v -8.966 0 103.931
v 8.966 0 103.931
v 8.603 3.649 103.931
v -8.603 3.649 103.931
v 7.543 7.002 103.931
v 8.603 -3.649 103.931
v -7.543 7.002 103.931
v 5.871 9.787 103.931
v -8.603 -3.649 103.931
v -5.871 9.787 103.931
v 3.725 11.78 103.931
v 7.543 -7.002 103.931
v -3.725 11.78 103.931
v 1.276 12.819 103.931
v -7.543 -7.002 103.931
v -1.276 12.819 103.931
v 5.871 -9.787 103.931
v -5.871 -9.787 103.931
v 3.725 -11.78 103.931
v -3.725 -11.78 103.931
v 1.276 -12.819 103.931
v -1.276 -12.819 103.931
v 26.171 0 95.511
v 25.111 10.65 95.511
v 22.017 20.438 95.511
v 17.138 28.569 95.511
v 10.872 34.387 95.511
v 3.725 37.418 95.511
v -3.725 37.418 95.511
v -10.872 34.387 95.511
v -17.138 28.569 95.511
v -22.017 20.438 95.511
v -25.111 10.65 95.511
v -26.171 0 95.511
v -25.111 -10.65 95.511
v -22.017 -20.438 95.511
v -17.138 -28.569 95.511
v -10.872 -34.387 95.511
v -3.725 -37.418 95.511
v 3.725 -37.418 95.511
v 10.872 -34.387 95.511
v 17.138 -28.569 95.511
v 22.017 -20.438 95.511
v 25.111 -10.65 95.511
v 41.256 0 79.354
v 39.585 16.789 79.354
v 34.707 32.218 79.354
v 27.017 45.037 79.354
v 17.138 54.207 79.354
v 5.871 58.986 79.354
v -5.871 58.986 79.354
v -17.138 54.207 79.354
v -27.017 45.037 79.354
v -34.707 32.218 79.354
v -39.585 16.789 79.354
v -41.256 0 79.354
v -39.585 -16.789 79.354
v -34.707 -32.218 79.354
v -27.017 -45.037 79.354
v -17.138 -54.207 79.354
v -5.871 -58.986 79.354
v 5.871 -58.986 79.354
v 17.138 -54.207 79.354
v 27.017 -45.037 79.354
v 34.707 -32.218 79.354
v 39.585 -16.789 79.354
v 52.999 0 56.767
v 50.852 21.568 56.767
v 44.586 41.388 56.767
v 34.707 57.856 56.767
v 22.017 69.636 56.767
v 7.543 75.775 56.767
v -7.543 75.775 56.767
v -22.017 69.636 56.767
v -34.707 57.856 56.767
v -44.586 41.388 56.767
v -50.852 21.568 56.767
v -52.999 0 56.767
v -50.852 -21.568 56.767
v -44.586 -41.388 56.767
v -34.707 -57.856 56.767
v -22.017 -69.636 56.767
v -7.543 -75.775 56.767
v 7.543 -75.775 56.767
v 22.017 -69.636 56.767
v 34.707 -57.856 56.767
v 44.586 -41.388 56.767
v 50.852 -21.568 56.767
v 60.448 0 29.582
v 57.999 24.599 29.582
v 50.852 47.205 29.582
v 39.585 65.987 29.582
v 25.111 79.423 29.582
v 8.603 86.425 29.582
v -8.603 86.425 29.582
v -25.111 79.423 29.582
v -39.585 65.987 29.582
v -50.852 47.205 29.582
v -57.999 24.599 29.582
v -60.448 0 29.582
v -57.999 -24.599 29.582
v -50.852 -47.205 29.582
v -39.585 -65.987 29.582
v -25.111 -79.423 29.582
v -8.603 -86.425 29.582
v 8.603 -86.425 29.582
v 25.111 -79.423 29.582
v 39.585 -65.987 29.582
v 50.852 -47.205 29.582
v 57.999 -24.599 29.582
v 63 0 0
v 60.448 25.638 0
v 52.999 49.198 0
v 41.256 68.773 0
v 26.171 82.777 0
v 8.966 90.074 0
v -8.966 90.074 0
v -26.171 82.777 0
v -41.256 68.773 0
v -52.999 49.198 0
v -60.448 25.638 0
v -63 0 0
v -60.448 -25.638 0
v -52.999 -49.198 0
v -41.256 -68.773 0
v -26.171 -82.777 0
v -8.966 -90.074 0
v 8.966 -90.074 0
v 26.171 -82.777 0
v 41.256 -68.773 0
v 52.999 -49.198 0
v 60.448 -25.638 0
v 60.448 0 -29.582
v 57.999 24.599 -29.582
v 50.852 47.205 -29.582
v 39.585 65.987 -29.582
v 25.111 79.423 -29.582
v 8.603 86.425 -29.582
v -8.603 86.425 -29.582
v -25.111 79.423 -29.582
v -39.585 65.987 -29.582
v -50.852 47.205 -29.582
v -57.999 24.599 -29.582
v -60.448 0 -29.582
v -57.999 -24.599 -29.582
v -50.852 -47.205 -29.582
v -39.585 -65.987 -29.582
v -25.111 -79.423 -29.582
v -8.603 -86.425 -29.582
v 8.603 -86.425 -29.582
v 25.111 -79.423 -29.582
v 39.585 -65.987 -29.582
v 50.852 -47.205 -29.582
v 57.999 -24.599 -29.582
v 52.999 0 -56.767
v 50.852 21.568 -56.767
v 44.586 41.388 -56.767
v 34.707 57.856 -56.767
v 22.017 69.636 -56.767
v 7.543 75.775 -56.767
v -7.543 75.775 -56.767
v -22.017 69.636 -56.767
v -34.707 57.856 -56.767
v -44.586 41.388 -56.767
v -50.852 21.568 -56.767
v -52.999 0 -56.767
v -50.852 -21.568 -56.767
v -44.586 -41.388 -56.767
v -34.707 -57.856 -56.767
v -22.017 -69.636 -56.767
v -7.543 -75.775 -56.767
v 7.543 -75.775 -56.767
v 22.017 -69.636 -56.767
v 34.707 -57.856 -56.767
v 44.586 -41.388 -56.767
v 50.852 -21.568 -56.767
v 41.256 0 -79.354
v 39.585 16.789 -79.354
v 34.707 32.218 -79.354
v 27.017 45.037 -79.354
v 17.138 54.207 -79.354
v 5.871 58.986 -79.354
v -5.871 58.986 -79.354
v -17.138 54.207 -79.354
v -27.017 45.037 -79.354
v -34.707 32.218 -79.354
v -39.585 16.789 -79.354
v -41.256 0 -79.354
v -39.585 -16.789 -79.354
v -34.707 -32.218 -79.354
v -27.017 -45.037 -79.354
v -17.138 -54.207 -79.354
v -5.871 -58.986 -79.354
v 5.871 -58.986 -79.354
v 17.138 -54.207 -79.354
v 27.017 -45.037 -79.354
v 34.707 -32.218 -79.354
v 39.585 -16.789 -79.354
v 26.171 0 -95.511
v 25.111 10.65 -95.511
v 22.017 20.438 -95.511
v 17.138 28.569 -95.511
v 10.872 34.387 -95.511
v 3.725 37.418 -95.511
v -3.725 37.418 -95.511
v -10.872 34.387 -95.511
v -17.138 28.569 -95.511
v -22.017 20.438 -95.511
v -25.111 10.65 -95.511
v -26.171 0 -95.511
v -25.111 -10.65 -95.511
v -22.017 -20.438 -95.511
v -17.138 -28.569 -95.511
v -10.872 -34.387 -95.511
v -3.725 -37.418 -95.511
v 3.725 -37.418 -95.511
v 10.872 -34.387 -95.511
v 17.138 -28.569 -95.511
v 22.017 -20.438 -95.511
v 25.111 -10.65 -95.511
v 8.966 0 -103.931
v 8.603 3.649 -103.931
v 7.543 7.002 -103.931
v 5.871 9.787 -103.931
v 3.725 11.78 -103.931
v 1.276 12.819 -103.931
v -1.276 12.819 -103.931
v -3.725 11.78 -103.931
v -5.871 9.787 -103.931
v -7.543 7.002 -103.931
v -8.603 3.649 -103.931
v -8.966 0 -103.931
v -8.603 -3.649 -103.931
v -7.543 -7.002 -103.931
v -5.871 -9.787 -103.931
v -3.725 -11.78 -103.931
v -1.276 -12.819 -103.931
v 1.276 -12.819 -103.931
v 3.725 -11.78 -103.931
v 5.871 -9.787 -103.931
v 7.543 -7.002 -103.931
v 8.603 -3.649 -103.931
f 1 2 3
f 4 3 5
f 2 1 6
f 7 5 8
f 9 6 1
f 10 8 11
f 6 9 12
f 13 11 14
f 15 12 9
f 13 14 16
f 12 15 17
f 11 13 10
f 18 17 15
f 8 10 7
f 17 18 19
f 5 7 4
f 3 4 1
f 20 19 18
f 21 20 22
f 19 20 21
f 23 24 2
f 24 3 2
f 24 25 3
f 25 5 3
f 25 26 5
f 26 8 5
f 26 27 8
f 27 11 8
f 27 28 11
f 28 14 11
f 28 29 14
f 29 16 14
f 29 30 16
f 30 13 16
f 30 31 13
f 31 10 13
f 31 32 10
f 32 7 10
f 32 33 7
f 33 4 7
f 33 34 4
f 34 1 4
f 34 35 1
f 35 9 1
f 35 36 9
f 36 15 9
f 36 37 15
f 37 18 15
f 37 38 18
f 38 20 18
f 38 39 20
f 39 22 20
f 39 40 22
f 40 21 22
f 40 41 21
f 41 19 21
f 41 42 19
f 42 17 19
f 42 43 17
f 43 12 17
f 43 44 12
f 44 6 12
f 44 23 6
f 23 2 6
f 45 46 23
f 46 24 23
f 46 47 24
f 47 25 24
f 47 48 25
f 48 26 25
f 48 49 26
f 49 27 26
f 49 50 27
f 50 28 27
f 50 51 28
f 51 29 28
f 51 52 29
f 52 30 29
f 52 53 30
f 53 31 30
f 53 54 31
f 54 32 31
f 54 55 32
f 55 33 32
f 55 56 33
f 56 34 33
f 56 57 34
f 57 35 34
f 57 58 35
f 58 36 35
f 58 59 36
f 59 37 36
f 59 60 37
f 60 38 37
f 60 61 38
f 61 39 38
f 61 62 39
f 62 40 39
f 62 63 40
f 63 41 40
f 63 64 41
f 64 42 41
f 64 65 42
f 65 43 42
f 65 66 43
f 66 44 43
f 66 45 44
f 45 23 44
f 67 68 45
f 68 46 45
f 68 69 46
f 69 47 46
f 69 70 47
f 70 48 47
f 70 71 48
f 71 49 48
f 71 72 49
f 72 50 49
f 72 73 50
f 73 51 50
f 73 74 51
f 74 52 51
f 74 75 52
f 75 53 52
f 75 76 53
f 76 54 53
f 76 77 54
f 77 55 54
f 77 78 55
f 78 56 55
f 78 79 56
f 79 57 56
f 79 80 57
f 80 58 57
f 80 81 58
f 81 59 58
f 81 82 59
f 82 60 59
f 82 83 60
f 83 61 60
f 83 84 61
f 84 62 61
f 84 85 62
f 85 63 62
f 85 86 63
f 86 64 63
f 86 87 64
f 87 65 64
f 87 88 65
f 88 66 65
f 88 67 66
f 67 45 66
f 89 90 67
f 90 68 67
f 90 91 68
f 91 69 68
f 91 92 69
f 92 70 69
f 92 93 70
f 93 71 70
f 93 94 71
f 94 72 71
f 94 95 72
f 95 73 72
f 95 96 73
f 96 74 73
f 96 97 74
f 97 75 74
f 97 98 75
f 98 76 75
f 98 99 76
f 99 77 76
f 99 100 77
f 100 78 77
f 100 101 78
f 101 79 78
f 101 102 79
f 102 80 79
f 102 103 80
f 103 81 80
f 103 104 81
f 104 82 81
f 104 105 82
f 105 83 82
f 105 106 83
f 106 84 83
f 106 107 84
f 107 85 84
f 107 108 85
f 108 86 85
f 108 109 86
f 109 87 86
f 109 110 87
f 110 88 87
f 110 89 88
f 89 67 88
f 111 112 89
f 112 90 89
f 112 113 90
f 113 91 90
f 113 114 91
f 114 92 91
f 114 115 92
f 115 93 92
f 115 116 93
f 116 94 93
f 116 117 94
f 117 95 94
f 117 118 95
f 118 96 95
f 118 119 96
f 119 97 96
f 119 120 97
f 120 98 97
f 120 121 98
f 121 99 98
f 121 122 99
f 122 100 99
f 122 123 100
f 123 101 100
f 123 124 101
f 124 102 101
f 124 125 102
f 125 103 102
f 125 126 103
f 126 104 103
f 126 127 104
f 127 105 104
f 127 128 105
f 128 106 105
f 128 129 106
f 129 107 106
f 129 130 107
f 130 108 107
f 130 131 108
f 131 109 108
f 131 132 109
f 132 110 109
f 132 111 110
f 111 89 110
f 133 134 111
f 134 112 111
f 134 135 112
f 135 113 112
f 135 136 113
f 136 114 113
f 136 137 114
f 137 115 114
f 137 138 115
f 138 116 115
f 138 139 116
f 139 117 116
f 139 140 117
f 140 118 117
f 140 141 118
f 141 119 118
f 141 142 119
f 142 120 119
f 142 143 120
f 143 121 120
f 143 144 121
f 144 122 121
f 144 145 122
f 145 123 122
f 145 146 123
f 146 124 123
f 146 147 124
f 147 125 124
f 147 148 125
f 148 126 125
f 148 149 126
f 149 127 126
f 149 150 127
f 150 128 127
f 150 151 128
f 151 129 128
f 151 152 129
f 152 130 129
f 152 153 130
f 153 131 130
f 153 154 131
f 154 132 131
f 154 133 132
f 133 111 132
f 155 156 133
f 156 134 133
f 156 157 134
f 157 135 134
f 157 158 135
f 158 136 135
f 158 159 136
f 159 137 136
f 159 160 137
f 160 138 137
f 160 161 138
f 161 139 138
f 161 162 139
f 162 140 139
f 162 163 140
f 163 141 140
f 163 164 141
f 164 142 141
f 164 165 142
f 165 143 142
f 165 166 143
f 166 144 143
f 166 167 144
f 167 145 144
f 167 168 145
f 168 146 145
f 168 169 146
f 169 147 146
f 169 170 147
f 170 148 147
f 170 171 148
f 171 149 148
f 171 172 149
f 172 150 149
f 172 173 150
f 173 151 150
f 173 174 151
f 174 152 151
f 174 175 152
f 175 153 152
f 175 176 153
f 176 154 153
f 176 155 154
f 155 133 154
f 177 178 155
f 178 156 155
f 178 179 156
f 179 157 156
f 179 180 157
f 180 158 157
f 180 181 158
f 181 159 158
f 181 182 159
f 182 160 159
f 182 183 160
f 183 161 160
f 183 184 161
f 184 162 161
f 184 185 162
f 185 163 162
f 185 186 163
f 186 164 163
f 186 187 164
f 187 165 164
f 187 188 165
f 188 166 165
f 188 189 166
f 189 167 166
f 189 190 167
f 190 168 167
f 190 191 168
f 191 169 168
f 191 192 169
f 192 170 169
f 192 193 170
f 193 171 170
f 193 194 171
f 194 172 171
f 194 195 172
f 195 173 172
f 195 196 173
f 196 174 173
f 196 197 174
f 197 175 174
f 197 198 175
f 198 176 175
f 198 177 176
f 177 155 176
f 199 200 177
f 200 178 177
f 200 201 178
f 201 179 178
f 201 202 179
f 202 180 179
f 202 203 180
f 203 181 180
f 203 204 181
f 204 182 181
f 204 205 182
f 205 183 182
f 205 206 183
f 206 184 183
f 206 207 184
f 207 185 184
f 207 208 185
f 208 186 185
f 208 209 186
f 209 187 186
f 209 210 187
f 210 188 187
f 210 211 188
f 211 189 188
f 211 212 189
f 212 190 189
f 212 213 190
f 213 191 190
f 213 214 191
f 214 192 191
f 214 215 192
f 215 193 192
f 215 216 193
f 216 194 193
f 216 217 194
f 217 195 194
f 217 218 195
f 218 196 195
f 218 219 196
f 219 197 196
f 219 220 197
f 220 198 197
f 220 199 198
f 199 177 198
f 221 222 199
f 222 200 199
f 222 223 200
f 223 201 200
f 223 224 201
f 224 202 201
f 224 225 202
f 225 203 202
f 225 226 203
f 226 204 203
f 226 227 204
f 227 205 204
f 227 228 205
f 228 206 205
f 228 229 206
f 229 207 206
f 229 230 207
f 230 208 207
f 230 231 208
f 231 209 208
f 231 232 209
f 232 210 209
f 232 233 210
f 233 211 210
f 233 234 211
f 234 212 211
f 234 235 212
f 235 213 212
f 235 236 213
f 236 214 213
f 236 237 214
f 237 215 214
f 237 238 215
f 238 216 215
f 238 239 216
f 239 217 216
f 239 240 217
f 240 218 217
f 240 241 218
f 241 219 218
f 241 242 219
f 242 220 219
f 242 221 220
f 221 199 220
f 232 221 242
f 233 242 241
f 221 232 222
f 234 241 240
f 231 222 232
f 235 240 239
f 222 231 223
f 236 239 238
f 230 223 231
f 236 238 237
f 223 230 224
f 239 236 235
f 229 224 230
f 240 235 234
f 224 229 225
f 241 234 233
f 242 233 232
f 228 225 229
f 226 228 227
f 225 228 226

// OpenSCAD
// Generated by SolidPython 1.0.1 on 2020-07-29 00:46:49


scale(v = [9, 13, 15]) {
	sphere(r = 7);
}
/***********************************************
*********      SolidPython code:      **********
************************************************
 
# import packages: SolidPython
from solid import *
from solid.utils import *
from itertools import chain, combinations, permutations


class Resize:

    def __init__(self, scad_file):
        self.scad_file = scad_file
        #self.scad_file = import_scad(scad_file)
        # cone/cylinder param:
        self.r1 = 0
        self.r2 = 0
        self.h = 0
        # rectangular prism param:
        self.w = 0
        self.l = 0
        # ellipse param:
        self.r = 0

    # import OpenScad code (file name corresponds to shape)


    # classify shape + parameters
    def assign(self, param1, param2, param3):
        if self.scad_file == 'cone.scad':
            self.r1 = param1
            self.r2 = param2
            self.h = param3
        elif self.scad_file == 'cylinder.scad':
            self.r1 = param1
            self.r2 = param2
            self.h = param3
        elif self.scad_file == 'rectangularPrism.scad':
            self.h = param1
            self.l = param2
            self.w = param3
        else:
            self.r = param1
            self.h = param2

    # resize parameters
    def iterate(self):
        x = range(3, 20, 2)
        i = 1
        if self.scad_file == 'cone.scad':
            tempList = list(permutations(x, 2))
            for temp in tempList:
                param1 = temp[0]
                param2 = temp[1]
                filepath = 'produced_scad_files/' + 'cone' + str(param1) + '_' + str(param2) + '_' + '.scad'
                scad_render_to_file(cylinder(h=param1, r1=param2, r2=0), filepath)

        elif self.scad_file == 'cylinder.scad':
            tempList = list(permutations(x, 3))
            for temp in tempList:
                param1 = temp[0]
                param2 = temp[1]
                filepath = 'produced_scad_files/' + 'cylinder' + str(param1) + '_' + str(param2) + '_' + '.scad'
                scad_render_to_file(cylinder(h=param1, r1=param2, r2=param2), filepath)

        elif self.scad_file == 'rectangularPrism.scad':
            tempList = list(permutations(x, 3))
            for temp in tempList:
                param1 = temp[0]
                param2 = temp[1]
                param3 = temp[2]
                filepath = 'produced_scad_files/' + 'rectangularPrism' + str(param1) + '_' + str(param2) + '_' + str(
                    param3) + '.scad'
                scad_render_to_file(cube(size=(param1, param2, param3)), filepath)

        elif self.scad_file == 'ellipse.scad':
            tempList = list(permutations(x, 4))
            for temp in tempList:
                param1 = temp[0]
                param2 = temp[1]
                param3 = temp[2]
                param4 = temp[3]
                filepath = 'produced_scad_files/' + 'ellipse' + str(param1) + '_' + str(param2) + '_' + str(param3) + '_' + str(param4) + '.scad'
                scad_render_to_file(scale([param1, param2, param3])(sphere(r=param4)), filepath)

    def render_to_scadfile(self):
        scad_render_to_file(scad, 'example.scad') 
 
************************************************/
